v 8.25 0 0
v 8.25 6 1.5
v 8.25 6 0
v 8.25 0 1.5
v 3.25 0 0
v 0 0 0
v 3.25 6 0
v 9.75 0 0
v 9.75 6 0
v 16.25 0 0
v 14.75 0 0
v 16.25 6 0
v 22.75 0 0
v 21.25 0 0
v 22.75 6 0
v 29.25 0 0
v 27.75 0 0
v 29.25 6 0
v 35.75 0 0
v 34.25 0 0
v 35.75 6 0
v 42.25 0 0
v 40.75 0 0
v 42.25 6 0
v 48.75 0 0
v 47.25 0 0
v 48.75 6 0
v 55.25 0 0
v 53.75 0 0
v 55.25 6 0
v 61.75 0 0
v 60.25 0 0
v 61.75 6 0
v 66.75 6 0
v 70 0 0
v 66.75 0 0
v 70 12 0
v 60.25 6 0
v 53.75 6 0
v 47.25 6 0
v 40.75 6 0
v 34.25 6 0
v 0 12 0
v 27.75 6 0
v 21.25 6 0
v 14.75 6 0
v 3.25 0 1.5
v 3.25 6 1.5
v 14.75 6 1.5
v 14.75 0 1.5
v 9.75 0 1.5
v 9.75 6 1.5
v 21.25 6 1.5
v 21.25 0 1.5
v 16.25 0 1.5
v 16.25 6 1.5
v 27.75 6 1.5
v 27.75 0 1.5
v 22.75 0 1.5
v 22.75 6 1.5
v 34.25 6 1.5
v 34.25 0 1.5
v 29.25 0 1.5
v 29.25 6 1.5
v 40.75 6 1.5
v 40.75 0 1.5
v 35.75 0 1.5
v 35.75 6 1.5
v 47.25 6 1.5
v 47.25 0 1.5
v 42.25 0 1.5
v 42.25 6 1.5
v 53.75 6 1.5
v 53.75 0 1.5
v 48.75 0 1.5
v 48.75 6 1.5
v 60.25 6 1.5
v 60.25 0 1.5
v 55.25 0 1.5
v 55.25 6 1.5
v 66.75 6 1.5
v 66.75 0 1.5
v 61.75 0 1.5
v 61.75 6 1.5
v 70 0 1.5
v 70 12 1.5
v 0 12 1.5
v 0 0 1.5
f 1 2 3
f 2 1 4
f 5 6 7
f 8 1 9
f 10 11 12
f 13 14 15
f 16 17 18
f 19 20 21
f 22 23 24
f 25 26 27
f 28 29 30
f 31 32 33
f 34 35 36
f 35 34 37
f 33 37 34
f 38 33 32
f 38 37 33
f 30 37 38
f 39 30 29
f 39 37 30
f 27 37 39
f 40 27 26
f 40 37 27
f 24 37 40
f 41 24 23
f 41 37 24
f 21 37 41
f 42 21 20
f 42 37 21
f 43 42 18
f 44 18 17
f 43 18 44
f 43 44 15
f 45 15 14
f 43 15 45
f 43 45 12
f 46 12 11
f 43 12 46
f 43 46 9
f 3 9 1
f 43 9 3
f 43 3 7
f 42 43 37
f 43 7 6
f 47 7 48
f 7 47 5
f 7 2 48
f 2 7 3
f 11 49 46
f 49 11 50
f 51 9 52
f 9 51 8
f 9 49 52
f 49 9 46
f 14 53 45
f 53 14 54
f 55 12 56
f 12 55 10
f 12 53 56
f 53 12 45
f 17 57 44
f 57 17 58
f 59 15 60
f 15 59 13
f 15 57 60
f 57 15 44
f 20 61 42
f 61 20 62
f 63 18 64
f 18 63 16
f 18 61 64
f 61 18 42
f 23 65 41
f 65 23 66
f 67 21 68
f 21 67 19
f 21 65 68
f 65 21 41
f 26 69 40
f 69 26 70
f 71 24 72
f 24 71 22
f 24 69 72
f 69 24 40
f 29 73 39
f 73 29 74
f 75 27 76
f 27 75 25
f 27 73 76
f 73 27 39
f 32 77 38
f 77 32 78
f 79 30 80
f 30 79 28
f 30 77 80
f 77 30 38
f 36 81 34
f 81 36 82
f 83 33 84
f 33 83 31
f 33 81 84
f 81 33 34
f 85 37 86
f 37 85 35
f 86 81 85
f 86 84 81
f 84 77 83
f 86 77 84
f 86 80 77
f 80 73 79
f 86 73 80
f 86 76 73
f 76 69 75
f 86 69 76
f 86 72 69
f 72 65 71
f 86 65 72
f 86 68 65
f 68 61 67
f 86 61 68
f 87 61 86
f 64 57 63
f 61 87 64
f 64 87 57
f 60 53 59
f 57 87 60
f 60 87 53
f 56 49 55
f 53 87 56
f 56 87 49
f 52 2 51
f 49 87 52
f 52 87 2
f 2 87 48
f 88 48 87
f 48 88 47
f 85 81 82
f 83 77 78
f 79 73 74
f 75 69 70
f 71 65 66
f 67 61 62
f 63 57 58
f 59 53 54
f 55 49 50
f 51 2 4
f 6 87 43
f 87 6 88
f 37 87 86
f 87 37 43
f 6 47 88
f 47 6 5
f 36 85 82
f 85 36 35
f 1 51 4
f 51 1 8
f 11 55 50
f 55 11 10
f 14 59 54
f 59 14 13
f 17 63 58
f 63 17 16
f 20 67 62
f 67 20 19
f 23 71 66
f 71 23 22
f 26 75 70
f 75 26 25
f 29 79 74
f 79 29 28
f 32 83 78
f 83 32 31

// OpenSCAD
// 10-well Agarose Gel Casting Comb
// Designed for FDM printing, lying flat on the XY plane (Z=0).

// --- Dimensions ---
// Spine dimensions
$spine_length = 70;   // mm (X)
$spine_width = 12;    // mm (Y)
$plate_thickness = 1.5; // mm (Z)

// Tooth dimensions
$num_teeth = 10;
$tooth_width = 5.0;   // mm (X)
$tooth_length = 12;   // mm (Y) // Length hanging from spine
$tooth_gap = 1.5;     // mm (X)

// --- Calculations ---
// Total width of the tooth row
$total_tooth_width = $num_teeth * $tooth_width;
// Total width of the gaps
$total_gap_width = ($num_teeth - 1) * $tooth_gap;
// Total width of the tooth assembly
$total_assembly_width = $total_tooth_width + $total_gap_width;

// Offset to center the tooth assembly on the spine in X
$x_offset = ($spine_length - $total_assembly_width) / 2;

// --- Main Body ---
difference() {
    // 1. Create the main spine block
    // Dimensions: X = $spine_length, Y = $spine_width, Z = $plate_thickness
    // Centered at origin (X=0, Y=0)
    translate([0, 0, 0])
    cube([
        $spine_length, 
        $spine_width, 
        $plate_thickness
    ]);

    // 2. Cut out the teeth
    // We iterate through each tooth position
    for (i = [0 : $num_teeth - 1]) {
        // Calculate X position for this tooth
        // Start at x_offset, add (tooth_width + gap) * i
        current_x = $x_offset + ($tooth_width + $tooth_gap) * i;
        
        // Calculate Y position for this tooth
        // The tooth hangs from the top edge (Y = $spine_width/2)
        // The tooth extends downwards (-Y) by $tooth_length
        // Tooth Y range: [$spine_width/2 - $tooth_length, $spine_width/2]
        
        // Define the cutting volume
        // X range: [current_x, current_x + $tooth_width]
        // Y range: [$spine_width/2 - $tooth_length, $spine_width/2]
        // Z range: [0, $plate_thickness + 0.1] (slightly past the top face to ensure clean cut)
        
        translate([
            current_x, 
            $spine_width/2 - $tooth_length, 
            0
        ])
        cube([
            $tooth_width, 
            $tooth_length, 
            $plate_thickness + 0.1
        ]);
    }
}
